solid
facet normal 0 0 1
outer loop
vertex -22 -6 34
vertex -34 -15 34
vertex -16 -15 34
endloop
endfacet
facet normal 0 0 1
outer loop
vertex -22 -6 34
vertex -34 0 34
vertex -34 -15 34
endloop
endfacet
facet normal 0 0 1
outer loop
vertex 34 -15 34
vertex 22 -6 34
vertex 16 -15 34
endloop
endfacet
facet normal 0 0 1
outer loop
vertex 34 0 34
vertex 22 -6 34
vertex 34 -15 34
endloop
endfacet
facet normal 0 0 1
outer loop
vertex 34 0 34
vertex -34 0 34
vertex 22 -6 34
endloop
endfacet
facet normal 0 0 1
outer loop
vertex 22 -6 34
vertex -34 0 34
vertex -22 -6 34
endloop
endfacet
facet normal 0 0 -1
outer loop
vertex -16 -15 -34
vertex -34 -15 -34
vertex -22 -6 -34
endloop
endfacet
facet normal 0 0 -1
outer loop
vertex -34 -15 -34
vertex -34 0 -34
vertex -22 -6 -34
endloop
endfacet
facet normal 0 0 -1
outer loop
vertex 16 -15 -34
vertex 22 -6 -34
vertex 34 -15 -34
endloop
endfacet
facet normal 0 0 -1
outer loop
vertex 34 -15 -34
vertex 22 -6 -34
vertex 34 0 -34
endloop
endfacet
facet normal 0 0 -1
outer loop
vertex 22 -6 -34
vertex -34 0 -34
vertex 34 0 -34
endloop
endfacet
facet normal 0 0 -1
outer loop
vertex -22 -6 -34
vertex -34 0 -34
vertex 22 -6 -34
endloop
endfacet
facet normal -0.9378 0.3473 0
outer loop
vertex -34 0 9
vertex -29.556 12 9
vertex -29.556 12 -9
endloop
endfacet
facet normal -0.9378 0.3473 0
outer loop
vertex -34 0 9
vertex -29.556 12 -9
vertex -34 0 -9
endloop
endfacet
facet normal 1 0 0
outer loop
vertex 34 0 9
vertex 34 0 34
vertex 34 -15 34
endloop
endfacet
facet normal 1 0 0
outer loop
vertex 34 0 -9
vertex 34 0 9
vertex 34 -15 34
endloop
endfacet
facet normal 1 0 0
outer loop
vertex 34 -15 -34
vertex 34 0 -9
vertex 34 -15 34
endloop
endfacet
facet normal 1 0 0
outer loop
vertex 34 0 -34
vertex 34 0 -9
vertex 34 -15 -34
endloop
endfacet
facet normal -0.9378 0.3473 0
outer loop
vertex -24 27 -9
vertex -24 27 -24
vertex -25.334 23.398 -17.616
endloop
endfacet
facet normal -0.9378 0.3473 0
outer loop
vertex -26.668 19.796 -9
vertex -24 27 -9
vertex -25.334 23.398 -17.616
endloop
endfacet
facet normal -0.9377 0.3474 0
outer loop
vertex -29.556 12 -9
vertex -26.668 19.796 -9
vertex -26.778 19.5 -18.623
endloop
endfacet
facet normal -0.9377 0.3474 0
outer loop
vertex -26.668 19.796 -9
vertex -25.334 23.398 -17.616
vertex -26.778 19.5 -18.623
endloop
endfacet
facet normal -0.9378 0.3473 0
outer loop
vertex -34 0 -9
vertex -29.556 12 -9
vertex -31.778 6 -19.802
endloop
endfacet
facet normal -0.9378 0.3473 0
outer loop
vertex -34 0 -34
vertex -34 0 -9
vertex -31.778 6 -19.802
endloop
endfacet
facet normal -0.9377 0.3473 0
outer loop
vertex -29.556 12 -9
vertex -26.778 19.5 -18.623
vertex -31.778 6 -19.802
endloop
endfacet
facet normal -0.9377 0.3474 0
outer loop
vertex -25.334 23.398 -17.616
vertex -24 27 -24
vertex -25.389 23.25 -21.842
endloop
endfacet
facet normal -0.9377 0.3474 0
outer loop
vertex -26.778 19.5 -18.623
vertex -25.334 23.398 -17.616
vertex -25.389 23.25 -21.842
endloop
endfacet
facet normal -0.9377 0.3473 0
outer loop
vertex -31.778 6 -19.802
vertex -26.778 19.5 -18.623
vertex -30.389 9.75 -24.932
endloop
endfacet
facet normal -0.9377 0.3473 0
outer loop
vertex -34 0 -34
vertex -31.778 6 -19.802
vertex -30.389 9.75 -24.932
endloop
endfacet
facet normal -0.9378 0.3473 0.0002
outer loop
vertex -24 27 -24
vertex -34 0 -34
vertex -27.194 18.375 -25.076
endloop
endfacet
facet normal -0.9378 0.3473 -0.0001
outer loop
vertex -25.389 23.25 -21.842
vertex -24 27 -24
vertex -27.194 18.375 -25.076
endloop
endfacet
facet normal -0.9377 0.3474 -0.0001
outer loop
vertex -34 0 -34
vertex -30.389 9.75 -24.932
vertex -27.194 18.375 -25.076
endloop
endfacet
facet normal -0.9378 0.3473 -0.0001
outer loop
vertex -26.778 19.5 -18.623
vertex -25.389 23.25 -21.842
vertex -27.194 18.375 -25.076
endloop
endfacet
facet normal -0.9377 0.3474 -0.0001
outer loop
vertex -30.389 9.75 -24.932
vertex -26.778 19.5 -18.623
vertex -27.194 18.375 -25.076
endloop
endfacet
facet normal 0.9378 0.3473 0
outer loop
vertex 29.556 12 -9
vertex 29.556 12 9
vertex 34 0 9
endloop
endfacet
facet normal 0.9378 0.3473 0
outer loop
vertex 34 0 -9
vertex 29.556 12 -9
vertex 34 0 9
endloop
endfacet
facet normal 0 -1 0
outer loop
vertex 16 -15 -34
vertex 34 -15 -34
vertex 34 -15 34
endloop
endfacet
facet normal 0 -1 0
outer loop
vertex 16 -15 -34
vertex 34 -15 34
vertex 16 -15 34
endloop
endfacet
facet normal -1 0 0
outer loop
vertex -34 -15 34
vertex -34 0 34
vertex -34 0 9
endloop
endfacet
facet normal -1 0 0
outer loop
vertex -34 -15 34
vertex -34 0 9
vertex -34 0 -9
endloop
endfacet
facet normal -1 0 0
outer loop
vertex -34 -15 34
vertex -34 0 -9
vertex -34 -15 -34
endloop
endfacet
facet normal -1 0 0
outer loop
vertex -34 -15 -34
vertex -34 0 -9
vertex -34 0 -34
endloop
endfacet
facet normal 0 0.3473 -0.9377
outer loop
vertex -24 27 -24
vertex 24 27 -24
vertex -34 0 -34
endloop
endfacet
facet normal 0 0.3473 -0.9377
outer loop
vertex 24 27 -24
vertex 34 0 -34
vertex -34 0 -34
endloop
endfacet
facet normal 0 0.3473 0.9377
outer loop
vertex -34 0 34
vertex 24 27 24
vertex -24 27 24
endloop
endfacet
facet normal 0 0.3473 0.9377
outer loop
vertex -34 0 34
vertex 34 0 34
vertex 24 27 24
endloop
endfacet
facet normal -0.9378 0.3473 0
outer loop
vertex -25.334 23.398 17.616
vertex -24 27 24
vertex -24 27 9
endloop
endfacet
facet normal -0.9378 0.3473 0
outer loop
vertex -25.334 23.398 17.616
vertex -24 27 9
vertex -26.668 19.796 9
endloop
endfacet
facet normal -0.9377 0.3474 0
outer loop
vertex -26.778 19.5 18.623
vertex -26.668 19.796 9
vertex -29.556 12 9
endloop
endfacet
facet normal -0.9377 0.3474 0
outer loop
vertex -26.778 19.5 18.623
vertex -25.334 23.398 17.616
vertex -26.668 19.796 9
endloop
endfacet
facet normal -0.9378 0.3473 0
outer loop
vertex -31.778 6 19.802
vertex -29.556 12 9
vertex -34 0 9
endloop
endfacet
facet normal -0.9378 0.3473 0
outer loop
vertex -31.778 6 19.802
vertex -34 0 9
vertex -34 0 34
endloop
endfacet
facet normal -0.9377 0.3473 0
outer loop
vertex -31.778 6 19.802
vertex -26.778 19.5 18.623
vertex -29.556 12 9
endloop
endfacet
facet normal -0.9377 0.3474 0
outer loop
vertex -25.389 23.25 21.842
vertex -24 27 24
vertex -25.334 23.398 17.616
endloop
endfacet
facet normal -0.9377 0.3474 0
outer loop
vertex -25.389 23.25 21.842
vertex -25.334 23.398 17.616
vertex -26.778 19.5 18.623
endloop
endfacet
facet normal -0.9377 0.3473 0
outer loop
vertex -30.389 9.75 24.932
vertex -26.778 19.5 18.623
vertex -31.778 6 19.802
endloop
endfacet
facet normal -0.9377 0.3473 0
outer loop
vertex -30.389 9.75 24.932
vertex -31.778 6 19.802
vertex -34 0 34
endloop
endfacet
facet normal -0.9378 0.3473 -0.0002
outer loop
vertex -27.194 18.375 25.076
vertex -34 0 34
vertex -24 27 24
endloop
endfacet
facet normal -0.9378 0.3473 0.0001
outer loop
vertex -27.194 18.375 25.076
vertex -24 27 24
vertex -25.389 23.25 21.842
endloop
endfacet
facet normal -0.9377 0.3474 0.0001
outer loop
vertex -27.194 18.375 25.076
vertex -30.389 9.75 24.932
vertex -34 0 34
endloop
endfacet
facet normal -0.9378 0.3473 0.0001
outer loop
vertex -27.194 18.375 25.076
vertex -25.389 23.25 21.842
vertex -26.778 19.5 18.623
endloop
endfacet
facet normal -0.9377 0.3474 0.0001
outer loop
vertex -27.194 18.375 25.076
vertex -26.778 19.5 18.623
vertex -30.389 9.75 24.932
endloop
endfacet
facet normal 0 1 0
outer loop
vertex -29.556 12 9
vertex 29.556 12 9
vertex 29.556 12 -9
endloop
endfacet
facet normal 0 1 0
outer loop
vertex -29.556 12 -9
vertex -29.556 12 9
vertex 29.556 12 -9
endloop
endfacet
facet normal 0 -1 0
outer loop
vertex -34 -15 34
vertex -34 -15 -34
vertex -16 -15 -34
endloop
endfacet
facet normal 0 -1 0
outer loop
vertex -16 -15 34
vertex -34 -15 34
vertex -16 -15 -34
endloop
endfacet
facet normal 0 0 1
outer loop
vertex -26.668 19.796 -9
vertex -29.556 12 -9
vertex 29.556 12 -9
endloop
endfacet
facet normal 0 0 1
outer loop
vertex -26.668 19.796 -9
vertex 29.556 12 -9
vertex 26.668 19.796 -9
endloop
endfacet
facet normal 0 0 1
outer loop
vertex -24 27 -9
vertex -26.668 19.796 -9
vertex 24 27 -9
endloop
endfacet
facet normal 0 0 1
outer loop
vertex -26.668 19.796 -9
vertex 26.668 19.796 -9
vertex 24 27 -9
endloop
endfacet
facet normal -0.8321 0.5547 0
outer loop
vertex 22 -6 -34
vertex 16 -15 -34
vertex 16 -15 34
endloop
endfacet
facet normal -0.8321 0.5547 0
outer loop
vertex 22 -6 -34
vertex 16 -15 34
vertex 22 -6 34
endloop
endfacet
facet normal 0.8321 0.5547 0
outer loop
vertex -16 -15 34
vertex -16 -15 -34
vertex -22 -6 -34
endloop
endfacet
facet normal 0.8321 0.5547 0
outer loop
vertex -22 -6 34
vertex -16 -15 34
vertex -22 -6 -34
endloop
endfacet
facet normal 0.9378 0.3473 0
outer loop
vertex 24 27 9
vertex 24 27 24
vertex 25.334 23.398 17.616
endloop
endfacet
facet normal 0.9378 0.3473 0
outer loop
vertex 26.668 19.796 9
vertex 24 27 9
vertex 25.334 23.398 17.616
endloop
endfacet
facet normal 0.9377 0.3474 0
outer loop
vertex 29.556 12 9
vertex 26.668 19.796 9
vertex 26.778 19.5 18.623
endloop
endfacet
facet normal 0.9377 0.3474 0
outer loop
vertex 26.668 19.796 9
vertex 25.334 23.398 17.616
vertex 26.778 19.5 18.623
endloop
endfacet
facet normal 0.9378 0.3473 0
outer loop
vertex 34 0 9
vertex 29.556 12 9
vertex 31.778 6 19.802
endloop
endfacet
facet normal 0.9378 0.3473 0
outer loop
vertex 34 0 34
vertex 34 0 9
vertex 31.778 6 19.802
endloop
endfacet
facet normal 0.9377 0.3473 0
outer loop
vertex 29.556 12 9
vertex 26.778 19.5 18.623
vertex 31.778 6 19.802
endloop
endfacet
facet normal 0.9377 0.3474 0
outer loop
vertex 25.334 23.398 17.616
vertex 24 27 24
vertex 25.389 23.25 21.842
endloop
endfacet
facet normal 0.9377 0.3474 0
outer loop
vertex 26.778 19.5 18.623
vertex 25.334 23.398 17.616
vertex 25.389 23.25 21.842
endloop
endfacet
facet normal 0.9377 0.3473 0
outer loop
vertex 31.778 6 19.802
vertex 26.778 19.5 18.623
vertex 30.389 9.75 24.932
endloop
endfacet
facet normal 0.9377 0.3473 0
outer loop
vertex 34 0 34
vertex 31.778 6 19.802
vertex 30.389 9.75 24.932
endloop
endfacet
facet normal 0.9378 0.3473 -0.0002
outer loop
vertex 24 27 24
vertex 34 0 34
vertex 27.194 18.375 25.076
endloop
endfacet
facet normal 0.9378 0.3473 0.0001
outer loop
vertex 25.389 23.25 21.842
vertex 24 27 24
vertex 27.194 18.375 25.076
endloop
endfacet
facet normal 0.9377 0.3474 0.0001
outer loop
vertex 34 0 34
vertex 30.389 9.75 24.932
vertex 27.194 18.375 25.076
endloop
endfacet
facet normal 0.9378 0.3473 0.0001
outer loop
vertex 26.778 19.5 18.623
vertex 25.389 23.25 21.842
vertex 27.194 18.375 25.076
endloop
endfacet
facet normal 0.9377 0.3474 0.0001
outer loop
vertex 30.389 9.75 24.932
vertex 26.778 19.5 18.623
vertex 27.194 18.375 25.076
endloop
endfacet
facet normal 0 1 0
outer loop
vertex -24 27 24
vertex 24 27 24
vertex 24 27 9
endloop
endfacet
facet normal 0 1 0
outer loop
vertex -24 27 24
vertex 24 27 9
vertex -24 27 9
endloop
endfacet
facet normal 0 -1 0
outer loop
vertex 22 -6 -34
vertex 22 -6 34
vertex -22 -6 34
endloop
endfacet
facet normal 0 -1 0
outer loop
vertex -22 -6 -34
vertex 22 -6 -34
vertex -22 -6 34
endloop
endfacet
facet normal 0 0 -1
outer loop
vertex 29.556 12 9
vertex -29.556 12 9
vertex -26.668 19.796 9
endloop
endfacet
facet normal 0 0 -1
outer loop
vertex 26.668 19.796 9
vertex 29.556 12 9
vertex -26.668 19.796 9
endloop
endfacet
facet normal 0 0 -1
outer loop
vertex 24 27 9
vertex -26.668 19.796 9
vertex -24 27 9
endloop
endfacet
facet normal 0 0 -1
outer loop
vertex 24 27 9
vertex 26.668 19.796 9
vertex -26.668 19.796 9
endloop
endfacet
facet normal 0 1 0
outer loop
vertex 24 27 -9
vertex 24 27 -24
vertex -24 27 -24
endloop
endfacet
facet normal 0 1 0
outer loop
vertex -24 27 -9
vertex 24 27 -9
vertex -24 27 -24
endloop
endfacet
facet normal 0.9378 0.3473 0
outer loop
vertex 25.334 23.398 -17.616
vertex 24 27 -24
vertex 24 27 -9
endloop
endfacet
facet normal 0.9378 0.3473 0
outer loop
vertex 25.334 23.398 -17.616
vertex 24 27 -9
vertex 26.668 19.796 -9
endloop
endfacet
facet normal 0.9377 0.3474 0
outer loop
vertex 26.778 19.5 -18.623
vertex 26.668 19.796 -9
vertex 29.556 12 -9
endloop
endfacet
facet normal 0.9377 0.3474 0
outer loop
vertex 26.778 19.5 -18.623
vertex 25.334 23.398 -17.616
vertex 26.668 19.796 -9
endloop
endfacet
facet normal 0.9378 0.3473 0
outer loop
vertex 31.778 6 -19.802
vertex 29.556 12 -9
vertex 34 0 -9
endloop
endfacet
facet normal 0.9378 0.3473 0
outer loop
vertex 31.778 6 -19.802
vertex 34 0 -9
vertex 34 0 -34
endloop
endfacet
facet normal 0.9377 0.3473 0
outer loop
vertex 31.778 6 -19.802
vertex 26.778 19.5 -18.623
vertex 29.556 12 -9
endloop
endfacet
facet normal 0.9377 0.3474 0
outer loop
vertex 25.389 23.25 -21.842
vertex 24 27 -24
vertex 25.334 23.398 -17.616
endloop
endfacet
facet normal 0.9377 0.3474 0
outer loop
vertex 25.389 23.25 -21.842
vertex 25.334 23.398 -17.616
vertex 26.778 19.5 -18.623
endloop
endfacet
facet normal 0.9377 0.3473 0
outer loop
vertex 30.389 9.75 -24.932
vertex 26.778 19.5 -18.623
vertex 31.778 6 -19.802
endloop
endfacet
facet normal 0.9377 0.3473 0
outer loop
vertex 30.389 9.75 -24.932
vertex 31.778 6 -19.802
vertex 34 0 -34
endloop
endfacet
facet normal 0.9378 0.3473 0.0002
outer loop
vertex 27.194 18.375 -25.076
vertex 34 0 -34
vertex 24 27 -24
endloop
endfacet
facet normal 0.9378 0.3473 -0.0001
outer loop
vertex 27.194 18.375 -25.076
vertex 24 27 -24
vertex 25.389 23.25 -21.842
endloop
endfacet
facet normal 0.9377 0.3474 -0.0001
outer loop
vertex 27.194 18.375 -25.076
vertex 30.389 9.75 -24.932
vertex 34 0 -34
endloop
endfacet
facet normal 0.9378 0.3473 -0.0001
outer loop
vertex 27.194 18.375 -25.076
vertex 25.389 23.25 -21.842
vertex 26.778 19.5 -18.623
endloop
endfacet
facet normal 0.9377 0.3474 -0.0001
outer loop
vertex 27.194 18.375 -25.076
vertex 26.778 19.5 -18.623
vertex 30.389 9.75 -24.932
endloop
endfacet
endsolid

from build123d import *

# Parameters (mm, degrees)
SKETCH1_W           = 34
SKETCH1_H           = 6
BOSS_EXTRUDE2_DEPTH = 34
BOSS_EXTRUDE3_DEPTH = 34
CUT_EXTRUDE1_DEPTH  = 34
SKETCH10_W          = 9
SKETCH10_H          = 12
BOSS_EXTRUDE5_DEPTH = 34
CUT_EXTRUDE2_DEPTH  = 34


with BuildPart() as part:
    # Sketch1 → Boss-Extrude2 (new body)
    with BuildSketch(Plane.XY):
        with Locations((17, -3)):
            Rectangle(SKETCH1_W, SKETCH1_H)
    extrude(amount=BOSS_EXTRUDE2_DEPTH)

    # Sketch3 → Boss-Extrude3 (add)
    with BuildSketch(Plane.XY.offset(34)):
        Polygon((34, -6), (34, -15), (16, -15), (22, -6), align=None)
    extrude(amount=-BOSS_EXTRUDE3_DEPTH)

    # Sketch6 → section 0 of loft2
    with BuildSketch(Plane(origin=(0, 27, 0), x_dir=(1, 0, 0), z_dir=(0, 1, 0)), mode=Mode.PRIVATE) as loft2_s0:
        with BuildLine():
            Line((0, -9), (0, -24))
            Line((0, -24), (24, -24))
            Line((24, -24), (24, -9))
            Line((24, -9), (0, -9))
        make_face()
    # loft up to a face of the part (loft2)
    loft([loft2_s0.sketch, part.faces().sort_by_distance((17, 0, 17))[0]])

    # Sketch9 → Cut-Extrude1 (cut)
    with BuildSketch(Plane.ZY):
        Polygon((0, 0), (9, 0), (9, 27), align=None)
    extrude(amount=-CUT_EXTRUDE1_DEPTH, mode=Mode.SUBTRACT)

    # Sketch10 → Boss-Extrude5 (add)
    with BuildSketch(Plane.ZY):
        with Locations((4.5, 6)):
            Rectangle(SKETCH10_W, SKETCH10_H)
    extrude(amount=-BOSS_EXTRUDE5_DEPTH)

    # Sketch11 → Cut-Extrude2 (cut)
    with BuildSketch(Plane.XY.offset(9)):
        Polygon((34, 0), (34, 12), (29.555555556, 12), align=None)
    extrude(amount=-CUT_EXTRUDE2_DEPTH, mode=Mode.SUBTRACT)

    # Mirror1: part across plane


with BuildPart() as part_1:
    add(part.part)
    add(part.part.mirror(Plane(origin=(0, -6, 34), x_dir=(0, 0, 1), z_dir=(1, 0, 0))))

    # Mirror2: part across plane


with BuildPart() as part_2:
    add(part_1.part)
    add(part_1.part.mirror(Plane(origin=(0, 0, 0), x_dir=(1, 0, 0), z_dir=(0, 0, -1))))


solid = part_2.part
